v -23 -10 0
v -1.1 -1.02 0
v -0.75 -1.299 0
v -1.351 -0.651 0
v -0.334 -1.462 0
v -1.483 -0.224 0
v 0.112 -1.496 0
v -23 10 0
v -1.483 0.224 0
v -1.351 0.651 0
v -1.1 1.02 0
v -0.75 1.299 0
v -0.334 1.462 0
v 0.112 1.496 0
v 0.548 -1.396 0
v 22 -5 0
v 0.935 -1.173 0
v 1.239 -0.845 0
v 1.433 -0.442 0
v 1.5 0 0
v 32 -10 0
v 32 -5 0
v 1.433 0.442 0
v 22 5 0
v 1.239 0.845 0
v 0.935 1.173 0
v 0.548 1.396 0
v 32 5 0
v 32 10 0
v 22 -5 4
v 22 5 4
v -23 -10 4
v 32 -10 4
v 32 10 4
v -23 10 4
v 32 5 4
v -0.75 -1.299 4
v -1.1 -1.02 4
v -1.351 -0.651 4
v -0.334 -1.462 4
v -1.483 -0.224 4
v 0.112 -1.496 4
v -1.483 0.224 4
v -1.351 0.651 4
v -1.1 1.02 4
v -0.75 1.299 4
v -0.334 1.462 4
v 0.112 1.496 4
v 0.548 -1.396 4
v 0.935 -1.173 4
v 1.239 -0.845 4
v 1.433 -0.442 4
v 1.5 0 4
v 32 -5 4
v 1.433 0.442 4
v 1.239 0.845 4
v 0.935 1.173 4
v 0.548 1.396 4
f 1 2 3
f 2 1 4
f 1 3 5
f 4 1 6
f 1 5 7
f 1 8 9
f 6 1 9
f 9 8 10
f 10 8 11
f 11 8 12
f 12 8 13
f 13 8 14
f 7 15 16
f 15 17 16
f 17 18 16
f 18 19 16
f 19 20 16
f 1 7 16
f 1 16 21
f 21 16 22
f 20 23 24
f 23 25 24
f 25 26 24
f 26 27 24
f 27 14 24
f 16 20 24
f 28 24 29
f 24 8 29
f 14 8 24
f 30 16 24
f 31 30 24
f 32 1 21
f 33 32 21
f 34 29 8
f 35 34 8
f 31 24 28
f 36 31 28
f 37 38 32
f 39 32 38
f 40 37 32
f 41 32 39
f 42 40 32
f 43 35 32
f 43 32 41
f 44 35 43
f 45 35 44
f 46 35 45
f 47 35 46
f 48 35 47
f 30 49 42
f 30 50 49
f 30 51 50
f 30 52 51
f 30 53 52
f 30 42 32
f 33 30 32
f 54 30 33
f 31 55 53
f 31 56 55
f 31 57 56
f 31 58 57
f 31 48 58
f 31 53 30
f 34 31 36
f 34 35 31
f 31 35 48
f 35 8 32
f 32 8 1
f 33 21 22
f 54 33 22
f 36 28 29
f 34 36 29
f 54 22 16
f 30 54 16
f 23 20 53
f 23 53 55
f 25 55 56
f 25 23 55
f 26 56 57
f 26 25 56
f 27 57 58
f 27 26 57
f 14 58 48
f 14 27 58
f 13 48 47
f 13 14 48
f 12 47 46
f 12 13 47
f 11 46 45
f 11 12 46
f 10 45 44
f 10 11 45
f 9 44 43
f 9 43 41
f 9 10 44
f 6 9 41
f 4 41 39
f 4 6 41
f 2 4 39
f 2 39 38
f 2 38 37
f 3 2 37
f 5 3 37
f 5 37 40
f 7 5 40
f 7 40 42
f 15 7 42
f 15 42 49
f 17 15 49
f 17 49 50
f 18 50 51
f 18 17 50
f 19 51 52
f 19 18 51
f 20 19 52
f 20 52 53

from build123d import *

# Parameters (mm, degrees)
F0_R     = 1.5
F1_DEPTH = 4


with BuildPart() as f1:
    # F0 (on Top) → F1 (new body)
    with BuildSketch(Plane.XY):
        Polygon((-23, 10), (-23, 0), (-23, -10), (32, -10), (32, -5), (22, -5), (22, 0), (22, 5), (32, 5), (32, 10), align=None)
        Circle(F0_R, mode=Mode.SUBTRACT)
    extrude(amount=F1_DEPTH)


solid = f1.part
